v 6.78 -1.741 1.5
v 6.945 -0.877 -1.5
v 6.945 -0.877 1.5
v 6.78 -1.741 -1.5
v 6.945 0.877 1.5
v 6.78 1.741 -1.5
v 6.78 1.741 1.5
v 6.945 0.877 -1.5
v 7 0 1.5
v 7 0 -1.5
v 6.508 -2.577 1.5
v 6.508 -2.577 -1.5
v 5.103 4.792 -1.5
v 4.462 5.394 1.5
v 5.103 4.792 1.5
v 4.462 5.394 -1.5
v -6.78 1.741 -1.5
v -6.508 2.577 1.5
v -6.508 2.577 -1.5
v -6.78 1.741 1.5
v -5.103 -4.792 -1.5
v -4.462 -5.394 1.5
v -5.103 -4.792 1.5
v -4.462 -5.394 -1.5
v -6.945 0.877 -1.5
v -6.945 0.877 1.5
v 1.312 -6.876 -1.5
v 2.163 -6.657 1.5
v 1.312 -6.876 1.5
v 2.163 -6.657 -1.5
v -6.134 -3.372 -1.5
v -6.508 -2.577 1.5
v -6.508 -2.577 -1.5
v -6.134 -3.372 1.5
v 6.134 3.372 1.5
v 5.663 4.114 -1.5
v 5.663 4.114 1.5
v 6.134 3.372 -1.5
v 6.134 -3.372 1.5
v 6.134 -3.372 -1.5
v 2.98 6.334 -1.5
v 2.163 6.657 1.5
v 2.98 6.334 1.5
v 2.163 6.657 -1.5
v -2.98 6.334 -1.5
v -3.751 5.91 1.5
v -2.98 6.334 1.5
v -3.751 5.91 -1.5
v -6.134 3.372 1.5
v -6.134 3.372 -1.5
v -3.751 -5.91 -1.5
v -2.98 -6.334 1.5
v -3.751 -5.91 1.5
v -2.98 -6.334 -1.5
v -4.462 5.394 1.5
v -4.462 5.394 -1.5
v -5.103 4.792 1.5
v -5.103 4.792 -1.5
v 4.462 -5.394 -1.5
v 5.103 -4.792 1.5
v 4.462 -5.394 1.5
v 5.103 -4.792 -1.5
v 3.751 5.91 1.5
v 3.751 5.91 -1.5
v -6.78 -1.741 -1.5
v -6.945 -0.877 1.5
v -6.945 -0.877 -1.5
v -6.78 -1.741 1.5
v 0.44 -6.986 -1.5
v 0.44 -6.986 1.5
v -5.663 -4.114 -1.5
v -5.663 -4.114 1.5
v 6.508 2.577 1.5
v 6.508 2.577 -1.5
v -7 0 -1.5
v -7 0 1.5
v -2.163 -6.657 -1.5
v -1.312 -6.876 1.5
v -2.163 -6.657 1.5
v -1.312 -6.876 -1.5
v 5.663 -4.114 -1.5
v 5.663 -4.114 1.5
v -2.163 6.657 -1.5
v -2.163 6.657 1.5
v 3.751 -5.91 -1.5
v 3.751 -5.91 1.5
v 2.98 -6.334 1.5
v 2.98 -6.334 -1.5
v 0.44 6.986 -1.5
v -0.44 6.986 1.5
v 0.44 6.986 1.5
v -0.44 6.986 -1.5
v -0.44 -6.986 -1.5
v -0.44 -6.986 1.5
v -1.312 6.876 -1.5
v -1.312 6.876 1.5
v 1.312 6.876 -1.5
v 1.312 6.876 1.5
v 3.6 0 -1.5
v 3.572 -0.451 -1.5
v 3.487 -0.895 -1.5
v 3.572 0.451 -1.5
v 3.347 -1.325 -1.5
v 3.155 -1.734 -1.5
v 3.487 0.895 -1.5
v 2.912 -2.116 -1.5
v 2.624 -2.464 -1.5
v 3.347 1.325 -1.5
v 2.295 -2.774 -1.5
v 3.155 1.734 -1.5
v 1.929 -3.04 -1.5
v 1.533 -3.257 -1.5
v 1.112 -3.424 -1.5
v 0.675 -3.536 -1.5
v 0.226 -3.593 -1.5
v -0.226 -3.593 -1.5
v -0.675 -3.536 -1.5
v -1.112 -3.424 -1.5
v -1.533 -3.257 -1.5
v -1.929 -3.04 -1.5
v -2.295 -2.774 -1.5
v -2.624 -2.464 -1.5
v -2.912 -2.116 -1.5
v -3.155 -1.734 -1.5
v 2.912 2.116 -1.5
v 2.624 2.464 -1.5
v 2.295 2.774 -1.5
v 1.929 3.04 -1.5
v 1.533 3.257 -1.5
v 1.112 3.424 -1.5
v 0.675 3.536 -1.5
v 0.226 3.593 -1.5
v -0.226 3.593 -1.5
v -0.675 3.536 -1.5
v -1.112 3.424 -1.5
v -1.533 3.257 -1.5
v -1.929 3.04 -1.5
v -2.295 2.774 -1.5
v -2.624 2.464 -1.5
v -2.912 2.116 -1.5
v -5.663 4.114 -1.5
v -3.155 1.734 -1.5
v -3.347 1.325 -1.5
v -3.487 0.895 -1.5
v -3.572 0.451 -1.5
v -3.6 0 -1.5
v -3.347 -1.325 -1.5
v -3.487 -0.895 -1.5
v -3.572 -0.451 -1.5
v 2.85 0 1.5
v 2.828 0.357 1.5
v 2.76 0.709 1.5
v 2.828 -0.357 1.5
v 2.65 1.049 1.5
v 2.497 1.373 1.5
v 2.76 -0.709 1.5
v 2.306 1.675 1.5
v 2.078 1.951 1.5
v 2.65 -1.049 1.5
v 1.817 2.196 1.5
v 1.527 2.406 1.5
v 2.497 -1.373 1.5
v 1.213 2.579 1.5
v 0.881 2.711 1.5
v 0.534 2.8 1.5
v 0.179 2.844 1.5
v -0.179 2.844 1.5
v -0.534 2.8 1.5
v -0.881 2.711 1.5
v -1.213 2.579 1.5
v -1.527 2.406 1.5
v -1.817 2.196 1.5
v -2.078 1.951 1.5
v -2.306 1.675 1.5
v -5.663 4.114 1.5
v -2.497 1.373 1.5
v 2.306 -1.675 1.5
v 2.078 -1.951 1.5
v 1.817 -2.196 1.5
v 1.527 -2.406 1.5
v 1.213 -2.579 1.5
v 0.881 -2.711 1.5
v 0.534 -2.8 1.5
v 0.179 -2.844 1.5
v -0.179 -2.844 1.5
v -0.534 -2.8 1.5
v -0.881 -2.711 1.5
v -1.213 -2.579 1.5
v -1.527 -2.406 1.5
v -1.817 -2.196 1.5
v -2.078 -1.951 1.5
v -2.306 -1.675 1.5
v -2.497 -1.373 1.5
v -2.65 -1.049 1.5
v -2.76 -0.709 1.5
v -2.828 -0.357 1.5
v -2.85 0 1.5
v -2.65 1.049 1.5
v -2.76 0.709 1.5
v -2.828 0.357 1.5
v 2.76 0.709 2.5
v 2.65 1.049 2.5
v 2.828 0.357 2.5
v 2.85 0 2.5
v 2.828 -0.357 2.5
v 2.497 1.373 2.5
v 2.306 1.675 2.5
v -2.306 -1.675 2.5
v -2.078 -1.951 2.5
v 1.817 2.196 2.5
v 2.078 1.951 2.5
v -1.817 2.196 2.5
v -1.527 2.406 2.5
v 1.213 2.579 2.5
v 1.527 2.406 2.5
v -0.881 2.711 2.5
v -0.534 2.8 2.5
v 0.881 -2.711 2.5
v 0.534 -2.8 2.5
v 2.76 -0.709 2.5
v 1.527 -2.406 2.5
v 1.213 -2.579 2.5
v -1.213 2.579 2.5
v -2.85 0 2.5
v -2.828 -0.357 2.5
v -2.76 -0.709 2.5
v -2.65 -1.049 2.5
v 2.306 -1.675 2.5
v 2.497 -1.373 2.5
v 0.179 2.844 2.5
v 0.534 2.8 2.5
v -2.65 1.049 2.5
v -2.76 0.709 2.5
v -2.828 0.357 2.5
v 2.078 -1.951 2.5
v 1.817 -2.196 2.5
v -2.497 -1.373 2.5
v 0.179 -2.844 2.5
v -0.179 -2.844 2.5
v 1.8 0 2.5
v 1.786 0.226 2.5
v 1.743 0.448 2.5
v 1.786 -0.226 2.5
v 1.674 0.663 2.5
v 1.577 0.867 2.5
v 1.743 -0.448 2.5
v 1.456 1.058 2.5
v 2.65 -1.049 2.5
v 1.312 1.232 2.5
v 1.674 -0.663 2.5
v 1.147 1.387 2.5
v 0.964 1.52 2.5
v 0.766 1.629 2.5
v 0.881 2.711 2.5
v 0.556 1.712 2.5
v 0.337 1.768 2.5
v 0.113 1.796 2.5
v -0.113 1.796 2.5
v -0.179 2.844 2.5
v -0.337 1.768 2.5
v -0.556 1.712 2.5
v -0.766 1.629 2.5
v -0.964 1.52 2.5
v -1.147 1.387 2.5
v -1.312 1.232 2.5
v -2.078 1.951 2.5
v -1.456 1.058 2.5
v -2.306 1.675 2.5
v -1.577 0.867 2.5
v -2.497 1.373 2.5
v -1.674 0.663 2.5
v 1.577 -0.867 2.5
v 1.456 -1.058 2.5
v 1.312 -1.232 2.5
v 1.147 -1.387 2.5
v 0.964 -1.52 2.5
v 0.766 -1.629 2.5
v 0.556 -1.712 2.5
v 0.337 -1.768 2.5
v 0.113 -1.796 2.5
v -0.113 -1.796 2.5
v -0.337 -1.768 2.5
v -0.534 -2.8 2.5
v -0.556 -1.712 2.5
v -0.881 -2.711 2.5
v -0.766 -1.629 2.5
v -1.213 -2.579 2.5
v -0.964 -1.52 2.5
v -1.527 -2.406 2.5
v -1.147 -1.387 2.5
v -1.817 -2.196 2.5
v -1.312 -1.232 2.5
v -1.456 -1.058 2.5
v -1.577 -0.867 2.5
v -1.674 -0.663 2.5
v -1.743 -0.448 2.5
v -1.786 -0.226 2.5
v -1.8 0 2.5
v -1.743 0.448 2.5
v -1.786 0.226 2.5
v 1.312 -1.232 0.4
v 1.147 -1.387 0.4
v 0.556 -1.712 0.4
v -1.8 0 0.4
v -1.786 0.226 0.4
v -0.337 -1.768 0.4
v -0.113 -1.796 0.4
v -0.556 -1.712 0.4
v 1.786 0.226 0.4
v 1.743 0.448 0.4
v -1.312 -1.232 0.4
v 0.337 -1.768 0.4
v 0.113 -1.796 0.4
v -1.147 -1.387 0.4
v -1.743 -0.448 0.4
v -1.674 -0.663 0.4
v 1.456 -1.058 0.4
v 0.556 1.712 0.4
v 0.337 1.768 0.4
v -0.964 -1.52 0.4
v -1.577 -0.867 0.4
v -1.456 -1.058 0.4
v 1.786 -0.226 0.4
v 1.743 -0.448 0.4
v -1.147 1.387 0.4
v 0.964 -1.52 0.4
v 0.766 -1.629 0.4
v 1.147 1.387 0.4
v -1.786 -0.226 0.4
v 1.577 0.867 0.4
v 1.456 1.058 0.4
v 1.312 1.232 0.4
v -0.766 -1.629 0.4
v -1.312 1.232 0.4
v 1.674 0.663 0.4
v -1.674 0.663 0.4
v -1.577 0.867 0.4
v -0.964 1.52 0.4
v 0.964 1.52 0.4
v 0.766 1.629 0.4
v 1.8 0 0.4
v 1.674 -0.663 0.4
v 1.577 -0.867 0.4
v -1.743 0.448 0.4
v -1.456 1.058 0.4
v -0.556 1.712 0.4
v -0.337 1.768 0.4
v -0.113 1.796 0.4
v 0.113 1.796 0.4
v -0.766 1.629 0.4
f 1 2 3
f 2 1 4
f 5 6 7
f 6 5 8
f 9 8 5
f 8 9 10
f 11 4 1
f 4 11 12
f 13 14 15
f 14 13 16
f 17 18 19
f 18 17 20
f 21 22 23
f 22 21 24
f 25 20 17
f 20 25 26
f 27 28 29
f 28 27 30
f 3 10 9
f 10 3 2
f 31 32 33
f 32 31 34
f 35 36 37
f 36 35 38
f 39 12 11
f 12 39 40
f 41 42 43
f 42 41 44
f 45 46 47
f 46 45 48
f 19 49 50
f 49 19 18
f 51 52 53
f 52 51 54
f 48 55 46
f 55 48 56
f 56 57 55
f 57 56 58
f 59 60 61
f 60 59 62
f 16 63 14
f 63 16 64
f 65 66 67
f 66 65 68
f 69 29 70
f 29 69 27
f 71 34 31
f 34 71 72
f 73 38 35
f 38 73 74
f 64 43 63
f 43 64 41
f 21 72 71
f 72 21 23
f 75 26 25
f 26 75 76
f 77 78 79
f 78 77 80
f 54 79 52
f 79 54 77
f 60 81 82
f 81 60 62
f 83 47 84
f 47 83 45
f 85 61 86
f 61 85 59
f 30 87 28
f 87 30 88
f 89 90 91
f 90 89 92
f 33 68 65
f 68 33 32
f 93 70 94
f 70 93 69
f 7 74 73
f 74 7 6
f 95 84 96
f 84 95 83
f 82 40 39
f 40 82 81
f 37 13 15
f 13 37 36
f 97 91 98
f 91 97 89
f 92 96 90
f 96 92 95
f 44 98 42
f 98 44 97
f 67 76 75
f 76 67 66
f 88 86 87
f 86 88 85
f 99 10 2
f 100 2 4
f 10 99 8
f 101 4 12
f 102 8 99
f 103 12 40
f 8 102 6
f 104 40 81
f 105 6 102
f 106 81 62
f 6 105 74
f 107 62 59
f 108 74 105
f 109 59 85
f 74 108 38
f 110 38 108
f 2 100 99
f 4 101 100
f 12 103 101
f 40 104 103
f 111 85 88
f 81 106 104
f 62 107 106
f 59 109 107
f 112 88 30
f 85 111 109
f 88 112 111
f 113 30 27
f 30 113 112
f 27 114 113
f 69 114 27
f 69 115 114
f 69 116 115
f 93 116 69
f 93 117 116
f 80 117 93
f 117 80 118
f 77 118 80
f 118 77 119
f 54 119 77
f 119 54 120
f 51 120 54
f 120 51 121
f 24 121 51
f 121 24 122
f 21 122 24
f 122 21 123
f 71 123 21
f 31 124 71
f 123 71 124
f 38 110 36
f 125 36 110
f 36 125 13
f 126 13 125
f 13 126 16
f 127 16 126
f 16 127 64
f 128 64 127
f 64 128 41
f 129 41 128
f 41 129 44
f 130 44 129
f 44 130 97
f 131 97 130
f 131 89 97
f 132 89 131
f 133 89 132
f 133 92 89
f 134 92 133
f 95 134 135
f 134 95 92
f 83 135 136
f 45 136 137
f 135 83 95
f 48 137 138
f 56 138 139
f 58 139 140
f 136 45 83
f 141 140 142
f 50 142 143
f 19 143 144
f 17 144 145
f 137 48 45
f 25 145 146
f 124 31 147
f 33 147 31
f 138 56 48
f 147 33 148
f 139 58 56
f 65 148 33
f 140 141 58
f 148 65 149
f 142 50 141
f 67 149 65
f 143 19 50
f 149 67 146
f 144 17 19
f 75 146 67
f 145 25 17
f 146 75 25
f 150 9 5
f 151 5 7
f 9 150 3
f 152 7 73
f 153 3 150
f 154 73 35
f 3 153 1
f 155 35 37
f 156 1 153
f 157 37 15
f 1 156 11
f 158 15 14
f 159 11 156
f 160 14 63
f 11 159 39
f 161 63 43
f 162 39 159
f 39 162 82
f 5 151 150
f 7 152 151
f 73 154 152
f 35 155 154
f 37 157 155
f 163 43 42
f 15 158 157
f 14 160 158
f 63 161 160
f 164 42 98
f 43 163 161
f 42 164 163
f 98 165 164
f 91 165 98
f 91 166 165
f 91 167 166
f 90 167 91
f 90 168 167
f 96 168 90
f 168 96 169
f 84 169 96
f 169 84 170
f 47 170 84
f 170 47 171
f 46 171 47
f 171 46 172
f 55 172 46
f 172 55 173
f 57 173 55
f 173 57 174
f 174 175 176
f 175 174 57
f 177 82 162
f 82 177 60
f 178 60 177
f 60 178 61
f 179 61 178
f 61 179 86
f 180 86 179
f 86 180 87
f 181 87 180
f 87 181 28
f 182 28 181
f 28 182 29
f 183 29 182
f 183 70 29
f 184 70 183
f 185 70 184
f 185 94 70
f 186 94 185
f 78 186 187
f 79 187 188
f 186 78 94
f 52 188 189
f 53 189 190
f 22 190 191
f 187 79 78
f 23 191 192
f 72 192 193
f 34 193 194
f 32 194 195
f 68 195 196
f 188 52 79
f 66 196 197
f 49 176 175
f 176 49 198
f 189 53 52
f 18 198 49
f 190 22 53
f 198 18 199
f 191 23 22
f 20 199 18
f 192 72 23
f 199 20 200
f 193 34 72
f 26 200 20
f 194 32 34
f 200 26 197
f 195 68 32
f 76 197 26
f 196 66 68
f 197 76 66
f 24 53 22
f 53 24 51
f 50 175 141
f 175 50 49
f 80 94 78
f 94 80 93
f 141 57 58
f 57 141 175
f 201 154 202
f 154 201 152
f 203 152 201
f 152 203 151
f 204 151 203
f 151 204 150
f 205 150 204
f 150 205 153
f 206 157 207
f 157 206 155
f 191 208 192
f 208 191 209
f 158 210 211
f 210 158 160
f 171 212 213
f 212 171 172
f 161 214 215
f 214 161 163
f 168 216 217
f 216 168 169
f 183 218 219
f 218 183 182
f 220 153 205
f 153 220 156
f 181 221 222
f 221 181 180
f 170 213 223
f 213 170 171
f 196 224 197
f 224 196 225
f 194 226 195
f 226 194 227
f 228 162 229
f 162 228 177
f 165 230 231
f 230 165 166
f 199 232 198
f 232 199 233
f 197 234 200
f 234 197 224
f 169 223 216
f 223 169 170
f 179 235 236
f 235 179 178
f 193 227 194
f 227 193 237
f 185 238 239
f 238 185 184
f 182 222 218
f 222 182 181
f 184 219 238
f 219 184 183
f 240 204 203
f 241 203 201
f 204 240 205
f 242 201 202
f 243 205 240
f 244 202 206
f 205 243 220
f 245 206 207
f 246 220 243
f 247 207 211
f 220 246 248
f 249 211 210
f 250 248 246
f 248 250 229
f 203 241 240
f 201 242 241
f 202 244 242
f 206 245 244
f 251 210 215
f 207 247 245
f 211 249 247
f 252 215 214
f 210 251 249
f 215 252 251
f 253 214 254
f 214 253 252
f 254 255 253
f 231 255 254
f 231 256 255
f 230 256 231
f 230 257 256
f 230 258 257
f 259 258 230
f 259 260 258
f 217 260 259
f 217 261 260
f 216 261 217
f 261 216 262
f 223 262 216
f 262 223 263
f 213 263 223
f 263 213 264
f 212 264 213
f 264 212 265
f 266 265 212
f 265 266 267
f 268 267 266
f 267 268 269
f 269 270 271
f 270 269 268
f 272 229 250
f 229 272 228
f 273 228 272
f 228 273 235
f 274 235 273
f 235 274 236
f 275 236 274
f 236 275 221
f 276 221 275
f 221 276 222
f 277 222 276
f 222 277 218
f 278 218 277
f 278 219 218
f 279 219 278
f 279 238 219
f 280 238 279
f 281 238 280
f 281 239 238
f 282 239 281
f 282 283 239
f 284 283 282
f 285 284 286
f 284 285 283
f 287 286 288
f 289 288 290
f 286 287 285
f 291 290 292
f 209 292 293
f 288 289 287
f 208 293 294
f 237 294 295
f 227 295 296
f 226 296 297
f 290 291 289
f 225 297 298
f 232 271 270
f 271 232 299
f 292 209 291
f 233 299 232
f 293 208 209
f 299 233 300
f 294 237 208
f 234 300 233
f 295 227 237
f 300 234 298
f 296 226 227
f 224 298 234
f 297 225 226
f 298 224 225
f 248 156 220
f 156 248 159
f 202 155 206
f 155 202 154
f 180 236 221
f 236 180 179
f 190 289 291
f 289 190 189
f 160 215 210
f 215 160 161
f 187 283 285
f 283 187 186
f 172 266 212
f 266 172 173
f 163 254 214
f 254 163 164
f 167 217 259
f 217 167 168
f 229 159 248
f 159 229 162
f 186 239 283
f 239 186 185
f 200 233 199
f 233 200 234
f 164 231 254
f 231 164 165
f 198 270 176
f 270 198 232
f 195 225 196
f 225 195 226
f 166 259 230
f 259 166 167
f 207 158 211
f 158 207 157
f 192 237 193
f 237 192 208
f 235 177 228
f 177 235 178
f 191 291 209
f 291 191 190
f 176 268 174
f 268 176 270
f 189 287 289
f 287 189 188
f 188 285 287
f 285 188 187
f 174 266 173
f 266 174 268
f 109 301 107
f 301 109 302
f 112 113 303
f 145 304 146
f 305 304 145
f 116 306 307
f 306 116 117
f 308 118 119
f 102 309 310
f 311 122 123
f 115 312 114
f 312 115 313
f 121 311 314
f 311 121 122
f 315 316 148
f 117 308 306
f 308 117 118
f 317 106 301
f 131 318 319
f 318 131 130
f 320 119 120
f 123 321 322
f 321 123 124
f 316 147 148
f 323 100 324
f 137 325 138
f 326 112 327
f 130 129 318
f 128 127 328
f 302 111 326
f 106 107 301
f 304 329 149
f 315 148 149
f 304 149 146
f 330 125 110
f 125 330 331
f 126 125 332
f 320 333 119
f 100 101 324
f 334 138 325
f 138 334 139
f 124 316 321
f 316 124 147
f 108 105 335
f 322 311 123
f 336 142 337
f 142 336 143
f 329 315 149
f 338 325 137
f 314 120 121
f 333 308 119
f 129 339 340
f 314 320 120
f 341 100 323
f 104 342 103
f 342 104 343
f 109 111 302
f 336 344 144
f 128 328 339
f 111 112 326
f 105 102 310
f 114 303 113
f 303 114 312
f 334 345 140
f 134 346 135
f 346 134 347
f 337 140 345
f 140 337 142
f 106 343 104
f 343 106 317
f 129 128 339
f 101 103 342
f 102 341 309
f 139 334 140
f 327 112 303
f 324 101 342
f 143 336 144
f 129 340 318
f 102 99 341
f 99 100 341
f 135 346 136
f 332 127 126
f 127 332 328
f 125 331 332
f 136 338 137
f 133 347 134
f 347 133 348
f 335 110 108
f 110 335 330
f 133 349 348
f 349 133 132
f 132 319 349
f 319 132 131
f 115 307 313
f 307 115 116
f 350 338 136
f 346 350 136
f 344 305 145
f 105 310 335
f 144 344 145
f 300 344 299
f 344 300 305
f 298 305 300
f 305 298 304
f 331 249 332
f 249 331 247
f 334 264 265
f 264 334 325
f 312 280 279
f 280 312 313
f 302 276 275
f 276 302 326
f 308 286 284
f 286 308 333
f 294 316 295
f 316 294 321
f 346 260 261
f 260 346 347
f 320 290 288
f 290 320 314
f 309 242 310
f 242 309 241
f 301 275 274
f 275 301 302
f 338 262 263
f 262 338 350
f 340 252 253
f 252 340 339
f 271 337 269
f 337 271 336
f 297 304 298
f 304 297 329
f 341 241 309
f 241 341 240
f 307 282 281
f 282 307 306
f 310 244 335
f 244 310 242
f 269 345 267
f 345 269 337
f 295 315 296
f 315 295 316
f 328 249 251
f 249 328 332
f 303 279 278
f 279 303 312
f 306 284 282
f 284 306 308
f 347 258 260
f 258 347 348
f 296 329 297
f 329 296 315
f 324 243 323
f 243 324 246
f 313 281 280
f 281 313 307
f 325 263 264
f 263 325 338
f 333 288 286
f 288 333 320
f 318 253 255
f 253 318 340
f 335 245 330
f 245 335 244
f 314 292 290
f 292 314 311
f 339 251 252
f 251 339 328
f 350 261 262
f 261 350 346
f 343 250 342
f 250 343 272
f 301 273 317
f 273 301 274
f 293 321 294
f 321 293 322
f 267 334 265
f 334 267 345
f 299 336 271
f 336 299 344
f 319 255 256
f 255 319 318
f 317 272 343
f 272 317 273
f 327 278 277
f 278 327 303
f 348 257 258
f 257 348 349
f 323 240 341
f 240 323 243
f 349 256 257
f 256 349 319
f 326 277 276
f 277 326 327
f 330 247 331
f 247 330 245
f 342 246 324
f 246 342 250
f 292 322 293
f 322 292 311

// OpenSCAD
$fn = 50;


difference() {
	union() {
		translate(v = [0, 0, -1.5000000000]) {
			cylinder(h = 3, r = 7.0000000000);
		}
		translate(v = [0, 0, -1.5000000000]) {
			cylinder(h = 4, r = 2.8500000000);
		}
	}
	union() {
		translate(v = [0, 0, -1.5000000000]) {
			rotate(a = [0, 180, 0]) {
				difference() {
					union() {
						translate(v = [0, 0, -4.0000000000]) {
							cylinder(h = 4, r = 1.5000000000);
						}
						translate(v = [0, 0, -1.9000000000]) {
							cylinder(h = 1.9000000000, r1 = 1.8000000000, r2 = 3.6000000000);
						}
						translate(v = [0, 0, -4.0000000000]) {
							cylinder(h = 4, r = 1.8000000000);
						}
						translate(v = [0, 0, -4.0000000000]) {
							cylinder(h = 4, r = 1.5000000000);
						}
					}
					union();
				}
			}
		}
		translate(v = [0, 0, -50.0000000000]) {
			cylinder(h = 100, r = 1.8000000000);
		}
	}
}
